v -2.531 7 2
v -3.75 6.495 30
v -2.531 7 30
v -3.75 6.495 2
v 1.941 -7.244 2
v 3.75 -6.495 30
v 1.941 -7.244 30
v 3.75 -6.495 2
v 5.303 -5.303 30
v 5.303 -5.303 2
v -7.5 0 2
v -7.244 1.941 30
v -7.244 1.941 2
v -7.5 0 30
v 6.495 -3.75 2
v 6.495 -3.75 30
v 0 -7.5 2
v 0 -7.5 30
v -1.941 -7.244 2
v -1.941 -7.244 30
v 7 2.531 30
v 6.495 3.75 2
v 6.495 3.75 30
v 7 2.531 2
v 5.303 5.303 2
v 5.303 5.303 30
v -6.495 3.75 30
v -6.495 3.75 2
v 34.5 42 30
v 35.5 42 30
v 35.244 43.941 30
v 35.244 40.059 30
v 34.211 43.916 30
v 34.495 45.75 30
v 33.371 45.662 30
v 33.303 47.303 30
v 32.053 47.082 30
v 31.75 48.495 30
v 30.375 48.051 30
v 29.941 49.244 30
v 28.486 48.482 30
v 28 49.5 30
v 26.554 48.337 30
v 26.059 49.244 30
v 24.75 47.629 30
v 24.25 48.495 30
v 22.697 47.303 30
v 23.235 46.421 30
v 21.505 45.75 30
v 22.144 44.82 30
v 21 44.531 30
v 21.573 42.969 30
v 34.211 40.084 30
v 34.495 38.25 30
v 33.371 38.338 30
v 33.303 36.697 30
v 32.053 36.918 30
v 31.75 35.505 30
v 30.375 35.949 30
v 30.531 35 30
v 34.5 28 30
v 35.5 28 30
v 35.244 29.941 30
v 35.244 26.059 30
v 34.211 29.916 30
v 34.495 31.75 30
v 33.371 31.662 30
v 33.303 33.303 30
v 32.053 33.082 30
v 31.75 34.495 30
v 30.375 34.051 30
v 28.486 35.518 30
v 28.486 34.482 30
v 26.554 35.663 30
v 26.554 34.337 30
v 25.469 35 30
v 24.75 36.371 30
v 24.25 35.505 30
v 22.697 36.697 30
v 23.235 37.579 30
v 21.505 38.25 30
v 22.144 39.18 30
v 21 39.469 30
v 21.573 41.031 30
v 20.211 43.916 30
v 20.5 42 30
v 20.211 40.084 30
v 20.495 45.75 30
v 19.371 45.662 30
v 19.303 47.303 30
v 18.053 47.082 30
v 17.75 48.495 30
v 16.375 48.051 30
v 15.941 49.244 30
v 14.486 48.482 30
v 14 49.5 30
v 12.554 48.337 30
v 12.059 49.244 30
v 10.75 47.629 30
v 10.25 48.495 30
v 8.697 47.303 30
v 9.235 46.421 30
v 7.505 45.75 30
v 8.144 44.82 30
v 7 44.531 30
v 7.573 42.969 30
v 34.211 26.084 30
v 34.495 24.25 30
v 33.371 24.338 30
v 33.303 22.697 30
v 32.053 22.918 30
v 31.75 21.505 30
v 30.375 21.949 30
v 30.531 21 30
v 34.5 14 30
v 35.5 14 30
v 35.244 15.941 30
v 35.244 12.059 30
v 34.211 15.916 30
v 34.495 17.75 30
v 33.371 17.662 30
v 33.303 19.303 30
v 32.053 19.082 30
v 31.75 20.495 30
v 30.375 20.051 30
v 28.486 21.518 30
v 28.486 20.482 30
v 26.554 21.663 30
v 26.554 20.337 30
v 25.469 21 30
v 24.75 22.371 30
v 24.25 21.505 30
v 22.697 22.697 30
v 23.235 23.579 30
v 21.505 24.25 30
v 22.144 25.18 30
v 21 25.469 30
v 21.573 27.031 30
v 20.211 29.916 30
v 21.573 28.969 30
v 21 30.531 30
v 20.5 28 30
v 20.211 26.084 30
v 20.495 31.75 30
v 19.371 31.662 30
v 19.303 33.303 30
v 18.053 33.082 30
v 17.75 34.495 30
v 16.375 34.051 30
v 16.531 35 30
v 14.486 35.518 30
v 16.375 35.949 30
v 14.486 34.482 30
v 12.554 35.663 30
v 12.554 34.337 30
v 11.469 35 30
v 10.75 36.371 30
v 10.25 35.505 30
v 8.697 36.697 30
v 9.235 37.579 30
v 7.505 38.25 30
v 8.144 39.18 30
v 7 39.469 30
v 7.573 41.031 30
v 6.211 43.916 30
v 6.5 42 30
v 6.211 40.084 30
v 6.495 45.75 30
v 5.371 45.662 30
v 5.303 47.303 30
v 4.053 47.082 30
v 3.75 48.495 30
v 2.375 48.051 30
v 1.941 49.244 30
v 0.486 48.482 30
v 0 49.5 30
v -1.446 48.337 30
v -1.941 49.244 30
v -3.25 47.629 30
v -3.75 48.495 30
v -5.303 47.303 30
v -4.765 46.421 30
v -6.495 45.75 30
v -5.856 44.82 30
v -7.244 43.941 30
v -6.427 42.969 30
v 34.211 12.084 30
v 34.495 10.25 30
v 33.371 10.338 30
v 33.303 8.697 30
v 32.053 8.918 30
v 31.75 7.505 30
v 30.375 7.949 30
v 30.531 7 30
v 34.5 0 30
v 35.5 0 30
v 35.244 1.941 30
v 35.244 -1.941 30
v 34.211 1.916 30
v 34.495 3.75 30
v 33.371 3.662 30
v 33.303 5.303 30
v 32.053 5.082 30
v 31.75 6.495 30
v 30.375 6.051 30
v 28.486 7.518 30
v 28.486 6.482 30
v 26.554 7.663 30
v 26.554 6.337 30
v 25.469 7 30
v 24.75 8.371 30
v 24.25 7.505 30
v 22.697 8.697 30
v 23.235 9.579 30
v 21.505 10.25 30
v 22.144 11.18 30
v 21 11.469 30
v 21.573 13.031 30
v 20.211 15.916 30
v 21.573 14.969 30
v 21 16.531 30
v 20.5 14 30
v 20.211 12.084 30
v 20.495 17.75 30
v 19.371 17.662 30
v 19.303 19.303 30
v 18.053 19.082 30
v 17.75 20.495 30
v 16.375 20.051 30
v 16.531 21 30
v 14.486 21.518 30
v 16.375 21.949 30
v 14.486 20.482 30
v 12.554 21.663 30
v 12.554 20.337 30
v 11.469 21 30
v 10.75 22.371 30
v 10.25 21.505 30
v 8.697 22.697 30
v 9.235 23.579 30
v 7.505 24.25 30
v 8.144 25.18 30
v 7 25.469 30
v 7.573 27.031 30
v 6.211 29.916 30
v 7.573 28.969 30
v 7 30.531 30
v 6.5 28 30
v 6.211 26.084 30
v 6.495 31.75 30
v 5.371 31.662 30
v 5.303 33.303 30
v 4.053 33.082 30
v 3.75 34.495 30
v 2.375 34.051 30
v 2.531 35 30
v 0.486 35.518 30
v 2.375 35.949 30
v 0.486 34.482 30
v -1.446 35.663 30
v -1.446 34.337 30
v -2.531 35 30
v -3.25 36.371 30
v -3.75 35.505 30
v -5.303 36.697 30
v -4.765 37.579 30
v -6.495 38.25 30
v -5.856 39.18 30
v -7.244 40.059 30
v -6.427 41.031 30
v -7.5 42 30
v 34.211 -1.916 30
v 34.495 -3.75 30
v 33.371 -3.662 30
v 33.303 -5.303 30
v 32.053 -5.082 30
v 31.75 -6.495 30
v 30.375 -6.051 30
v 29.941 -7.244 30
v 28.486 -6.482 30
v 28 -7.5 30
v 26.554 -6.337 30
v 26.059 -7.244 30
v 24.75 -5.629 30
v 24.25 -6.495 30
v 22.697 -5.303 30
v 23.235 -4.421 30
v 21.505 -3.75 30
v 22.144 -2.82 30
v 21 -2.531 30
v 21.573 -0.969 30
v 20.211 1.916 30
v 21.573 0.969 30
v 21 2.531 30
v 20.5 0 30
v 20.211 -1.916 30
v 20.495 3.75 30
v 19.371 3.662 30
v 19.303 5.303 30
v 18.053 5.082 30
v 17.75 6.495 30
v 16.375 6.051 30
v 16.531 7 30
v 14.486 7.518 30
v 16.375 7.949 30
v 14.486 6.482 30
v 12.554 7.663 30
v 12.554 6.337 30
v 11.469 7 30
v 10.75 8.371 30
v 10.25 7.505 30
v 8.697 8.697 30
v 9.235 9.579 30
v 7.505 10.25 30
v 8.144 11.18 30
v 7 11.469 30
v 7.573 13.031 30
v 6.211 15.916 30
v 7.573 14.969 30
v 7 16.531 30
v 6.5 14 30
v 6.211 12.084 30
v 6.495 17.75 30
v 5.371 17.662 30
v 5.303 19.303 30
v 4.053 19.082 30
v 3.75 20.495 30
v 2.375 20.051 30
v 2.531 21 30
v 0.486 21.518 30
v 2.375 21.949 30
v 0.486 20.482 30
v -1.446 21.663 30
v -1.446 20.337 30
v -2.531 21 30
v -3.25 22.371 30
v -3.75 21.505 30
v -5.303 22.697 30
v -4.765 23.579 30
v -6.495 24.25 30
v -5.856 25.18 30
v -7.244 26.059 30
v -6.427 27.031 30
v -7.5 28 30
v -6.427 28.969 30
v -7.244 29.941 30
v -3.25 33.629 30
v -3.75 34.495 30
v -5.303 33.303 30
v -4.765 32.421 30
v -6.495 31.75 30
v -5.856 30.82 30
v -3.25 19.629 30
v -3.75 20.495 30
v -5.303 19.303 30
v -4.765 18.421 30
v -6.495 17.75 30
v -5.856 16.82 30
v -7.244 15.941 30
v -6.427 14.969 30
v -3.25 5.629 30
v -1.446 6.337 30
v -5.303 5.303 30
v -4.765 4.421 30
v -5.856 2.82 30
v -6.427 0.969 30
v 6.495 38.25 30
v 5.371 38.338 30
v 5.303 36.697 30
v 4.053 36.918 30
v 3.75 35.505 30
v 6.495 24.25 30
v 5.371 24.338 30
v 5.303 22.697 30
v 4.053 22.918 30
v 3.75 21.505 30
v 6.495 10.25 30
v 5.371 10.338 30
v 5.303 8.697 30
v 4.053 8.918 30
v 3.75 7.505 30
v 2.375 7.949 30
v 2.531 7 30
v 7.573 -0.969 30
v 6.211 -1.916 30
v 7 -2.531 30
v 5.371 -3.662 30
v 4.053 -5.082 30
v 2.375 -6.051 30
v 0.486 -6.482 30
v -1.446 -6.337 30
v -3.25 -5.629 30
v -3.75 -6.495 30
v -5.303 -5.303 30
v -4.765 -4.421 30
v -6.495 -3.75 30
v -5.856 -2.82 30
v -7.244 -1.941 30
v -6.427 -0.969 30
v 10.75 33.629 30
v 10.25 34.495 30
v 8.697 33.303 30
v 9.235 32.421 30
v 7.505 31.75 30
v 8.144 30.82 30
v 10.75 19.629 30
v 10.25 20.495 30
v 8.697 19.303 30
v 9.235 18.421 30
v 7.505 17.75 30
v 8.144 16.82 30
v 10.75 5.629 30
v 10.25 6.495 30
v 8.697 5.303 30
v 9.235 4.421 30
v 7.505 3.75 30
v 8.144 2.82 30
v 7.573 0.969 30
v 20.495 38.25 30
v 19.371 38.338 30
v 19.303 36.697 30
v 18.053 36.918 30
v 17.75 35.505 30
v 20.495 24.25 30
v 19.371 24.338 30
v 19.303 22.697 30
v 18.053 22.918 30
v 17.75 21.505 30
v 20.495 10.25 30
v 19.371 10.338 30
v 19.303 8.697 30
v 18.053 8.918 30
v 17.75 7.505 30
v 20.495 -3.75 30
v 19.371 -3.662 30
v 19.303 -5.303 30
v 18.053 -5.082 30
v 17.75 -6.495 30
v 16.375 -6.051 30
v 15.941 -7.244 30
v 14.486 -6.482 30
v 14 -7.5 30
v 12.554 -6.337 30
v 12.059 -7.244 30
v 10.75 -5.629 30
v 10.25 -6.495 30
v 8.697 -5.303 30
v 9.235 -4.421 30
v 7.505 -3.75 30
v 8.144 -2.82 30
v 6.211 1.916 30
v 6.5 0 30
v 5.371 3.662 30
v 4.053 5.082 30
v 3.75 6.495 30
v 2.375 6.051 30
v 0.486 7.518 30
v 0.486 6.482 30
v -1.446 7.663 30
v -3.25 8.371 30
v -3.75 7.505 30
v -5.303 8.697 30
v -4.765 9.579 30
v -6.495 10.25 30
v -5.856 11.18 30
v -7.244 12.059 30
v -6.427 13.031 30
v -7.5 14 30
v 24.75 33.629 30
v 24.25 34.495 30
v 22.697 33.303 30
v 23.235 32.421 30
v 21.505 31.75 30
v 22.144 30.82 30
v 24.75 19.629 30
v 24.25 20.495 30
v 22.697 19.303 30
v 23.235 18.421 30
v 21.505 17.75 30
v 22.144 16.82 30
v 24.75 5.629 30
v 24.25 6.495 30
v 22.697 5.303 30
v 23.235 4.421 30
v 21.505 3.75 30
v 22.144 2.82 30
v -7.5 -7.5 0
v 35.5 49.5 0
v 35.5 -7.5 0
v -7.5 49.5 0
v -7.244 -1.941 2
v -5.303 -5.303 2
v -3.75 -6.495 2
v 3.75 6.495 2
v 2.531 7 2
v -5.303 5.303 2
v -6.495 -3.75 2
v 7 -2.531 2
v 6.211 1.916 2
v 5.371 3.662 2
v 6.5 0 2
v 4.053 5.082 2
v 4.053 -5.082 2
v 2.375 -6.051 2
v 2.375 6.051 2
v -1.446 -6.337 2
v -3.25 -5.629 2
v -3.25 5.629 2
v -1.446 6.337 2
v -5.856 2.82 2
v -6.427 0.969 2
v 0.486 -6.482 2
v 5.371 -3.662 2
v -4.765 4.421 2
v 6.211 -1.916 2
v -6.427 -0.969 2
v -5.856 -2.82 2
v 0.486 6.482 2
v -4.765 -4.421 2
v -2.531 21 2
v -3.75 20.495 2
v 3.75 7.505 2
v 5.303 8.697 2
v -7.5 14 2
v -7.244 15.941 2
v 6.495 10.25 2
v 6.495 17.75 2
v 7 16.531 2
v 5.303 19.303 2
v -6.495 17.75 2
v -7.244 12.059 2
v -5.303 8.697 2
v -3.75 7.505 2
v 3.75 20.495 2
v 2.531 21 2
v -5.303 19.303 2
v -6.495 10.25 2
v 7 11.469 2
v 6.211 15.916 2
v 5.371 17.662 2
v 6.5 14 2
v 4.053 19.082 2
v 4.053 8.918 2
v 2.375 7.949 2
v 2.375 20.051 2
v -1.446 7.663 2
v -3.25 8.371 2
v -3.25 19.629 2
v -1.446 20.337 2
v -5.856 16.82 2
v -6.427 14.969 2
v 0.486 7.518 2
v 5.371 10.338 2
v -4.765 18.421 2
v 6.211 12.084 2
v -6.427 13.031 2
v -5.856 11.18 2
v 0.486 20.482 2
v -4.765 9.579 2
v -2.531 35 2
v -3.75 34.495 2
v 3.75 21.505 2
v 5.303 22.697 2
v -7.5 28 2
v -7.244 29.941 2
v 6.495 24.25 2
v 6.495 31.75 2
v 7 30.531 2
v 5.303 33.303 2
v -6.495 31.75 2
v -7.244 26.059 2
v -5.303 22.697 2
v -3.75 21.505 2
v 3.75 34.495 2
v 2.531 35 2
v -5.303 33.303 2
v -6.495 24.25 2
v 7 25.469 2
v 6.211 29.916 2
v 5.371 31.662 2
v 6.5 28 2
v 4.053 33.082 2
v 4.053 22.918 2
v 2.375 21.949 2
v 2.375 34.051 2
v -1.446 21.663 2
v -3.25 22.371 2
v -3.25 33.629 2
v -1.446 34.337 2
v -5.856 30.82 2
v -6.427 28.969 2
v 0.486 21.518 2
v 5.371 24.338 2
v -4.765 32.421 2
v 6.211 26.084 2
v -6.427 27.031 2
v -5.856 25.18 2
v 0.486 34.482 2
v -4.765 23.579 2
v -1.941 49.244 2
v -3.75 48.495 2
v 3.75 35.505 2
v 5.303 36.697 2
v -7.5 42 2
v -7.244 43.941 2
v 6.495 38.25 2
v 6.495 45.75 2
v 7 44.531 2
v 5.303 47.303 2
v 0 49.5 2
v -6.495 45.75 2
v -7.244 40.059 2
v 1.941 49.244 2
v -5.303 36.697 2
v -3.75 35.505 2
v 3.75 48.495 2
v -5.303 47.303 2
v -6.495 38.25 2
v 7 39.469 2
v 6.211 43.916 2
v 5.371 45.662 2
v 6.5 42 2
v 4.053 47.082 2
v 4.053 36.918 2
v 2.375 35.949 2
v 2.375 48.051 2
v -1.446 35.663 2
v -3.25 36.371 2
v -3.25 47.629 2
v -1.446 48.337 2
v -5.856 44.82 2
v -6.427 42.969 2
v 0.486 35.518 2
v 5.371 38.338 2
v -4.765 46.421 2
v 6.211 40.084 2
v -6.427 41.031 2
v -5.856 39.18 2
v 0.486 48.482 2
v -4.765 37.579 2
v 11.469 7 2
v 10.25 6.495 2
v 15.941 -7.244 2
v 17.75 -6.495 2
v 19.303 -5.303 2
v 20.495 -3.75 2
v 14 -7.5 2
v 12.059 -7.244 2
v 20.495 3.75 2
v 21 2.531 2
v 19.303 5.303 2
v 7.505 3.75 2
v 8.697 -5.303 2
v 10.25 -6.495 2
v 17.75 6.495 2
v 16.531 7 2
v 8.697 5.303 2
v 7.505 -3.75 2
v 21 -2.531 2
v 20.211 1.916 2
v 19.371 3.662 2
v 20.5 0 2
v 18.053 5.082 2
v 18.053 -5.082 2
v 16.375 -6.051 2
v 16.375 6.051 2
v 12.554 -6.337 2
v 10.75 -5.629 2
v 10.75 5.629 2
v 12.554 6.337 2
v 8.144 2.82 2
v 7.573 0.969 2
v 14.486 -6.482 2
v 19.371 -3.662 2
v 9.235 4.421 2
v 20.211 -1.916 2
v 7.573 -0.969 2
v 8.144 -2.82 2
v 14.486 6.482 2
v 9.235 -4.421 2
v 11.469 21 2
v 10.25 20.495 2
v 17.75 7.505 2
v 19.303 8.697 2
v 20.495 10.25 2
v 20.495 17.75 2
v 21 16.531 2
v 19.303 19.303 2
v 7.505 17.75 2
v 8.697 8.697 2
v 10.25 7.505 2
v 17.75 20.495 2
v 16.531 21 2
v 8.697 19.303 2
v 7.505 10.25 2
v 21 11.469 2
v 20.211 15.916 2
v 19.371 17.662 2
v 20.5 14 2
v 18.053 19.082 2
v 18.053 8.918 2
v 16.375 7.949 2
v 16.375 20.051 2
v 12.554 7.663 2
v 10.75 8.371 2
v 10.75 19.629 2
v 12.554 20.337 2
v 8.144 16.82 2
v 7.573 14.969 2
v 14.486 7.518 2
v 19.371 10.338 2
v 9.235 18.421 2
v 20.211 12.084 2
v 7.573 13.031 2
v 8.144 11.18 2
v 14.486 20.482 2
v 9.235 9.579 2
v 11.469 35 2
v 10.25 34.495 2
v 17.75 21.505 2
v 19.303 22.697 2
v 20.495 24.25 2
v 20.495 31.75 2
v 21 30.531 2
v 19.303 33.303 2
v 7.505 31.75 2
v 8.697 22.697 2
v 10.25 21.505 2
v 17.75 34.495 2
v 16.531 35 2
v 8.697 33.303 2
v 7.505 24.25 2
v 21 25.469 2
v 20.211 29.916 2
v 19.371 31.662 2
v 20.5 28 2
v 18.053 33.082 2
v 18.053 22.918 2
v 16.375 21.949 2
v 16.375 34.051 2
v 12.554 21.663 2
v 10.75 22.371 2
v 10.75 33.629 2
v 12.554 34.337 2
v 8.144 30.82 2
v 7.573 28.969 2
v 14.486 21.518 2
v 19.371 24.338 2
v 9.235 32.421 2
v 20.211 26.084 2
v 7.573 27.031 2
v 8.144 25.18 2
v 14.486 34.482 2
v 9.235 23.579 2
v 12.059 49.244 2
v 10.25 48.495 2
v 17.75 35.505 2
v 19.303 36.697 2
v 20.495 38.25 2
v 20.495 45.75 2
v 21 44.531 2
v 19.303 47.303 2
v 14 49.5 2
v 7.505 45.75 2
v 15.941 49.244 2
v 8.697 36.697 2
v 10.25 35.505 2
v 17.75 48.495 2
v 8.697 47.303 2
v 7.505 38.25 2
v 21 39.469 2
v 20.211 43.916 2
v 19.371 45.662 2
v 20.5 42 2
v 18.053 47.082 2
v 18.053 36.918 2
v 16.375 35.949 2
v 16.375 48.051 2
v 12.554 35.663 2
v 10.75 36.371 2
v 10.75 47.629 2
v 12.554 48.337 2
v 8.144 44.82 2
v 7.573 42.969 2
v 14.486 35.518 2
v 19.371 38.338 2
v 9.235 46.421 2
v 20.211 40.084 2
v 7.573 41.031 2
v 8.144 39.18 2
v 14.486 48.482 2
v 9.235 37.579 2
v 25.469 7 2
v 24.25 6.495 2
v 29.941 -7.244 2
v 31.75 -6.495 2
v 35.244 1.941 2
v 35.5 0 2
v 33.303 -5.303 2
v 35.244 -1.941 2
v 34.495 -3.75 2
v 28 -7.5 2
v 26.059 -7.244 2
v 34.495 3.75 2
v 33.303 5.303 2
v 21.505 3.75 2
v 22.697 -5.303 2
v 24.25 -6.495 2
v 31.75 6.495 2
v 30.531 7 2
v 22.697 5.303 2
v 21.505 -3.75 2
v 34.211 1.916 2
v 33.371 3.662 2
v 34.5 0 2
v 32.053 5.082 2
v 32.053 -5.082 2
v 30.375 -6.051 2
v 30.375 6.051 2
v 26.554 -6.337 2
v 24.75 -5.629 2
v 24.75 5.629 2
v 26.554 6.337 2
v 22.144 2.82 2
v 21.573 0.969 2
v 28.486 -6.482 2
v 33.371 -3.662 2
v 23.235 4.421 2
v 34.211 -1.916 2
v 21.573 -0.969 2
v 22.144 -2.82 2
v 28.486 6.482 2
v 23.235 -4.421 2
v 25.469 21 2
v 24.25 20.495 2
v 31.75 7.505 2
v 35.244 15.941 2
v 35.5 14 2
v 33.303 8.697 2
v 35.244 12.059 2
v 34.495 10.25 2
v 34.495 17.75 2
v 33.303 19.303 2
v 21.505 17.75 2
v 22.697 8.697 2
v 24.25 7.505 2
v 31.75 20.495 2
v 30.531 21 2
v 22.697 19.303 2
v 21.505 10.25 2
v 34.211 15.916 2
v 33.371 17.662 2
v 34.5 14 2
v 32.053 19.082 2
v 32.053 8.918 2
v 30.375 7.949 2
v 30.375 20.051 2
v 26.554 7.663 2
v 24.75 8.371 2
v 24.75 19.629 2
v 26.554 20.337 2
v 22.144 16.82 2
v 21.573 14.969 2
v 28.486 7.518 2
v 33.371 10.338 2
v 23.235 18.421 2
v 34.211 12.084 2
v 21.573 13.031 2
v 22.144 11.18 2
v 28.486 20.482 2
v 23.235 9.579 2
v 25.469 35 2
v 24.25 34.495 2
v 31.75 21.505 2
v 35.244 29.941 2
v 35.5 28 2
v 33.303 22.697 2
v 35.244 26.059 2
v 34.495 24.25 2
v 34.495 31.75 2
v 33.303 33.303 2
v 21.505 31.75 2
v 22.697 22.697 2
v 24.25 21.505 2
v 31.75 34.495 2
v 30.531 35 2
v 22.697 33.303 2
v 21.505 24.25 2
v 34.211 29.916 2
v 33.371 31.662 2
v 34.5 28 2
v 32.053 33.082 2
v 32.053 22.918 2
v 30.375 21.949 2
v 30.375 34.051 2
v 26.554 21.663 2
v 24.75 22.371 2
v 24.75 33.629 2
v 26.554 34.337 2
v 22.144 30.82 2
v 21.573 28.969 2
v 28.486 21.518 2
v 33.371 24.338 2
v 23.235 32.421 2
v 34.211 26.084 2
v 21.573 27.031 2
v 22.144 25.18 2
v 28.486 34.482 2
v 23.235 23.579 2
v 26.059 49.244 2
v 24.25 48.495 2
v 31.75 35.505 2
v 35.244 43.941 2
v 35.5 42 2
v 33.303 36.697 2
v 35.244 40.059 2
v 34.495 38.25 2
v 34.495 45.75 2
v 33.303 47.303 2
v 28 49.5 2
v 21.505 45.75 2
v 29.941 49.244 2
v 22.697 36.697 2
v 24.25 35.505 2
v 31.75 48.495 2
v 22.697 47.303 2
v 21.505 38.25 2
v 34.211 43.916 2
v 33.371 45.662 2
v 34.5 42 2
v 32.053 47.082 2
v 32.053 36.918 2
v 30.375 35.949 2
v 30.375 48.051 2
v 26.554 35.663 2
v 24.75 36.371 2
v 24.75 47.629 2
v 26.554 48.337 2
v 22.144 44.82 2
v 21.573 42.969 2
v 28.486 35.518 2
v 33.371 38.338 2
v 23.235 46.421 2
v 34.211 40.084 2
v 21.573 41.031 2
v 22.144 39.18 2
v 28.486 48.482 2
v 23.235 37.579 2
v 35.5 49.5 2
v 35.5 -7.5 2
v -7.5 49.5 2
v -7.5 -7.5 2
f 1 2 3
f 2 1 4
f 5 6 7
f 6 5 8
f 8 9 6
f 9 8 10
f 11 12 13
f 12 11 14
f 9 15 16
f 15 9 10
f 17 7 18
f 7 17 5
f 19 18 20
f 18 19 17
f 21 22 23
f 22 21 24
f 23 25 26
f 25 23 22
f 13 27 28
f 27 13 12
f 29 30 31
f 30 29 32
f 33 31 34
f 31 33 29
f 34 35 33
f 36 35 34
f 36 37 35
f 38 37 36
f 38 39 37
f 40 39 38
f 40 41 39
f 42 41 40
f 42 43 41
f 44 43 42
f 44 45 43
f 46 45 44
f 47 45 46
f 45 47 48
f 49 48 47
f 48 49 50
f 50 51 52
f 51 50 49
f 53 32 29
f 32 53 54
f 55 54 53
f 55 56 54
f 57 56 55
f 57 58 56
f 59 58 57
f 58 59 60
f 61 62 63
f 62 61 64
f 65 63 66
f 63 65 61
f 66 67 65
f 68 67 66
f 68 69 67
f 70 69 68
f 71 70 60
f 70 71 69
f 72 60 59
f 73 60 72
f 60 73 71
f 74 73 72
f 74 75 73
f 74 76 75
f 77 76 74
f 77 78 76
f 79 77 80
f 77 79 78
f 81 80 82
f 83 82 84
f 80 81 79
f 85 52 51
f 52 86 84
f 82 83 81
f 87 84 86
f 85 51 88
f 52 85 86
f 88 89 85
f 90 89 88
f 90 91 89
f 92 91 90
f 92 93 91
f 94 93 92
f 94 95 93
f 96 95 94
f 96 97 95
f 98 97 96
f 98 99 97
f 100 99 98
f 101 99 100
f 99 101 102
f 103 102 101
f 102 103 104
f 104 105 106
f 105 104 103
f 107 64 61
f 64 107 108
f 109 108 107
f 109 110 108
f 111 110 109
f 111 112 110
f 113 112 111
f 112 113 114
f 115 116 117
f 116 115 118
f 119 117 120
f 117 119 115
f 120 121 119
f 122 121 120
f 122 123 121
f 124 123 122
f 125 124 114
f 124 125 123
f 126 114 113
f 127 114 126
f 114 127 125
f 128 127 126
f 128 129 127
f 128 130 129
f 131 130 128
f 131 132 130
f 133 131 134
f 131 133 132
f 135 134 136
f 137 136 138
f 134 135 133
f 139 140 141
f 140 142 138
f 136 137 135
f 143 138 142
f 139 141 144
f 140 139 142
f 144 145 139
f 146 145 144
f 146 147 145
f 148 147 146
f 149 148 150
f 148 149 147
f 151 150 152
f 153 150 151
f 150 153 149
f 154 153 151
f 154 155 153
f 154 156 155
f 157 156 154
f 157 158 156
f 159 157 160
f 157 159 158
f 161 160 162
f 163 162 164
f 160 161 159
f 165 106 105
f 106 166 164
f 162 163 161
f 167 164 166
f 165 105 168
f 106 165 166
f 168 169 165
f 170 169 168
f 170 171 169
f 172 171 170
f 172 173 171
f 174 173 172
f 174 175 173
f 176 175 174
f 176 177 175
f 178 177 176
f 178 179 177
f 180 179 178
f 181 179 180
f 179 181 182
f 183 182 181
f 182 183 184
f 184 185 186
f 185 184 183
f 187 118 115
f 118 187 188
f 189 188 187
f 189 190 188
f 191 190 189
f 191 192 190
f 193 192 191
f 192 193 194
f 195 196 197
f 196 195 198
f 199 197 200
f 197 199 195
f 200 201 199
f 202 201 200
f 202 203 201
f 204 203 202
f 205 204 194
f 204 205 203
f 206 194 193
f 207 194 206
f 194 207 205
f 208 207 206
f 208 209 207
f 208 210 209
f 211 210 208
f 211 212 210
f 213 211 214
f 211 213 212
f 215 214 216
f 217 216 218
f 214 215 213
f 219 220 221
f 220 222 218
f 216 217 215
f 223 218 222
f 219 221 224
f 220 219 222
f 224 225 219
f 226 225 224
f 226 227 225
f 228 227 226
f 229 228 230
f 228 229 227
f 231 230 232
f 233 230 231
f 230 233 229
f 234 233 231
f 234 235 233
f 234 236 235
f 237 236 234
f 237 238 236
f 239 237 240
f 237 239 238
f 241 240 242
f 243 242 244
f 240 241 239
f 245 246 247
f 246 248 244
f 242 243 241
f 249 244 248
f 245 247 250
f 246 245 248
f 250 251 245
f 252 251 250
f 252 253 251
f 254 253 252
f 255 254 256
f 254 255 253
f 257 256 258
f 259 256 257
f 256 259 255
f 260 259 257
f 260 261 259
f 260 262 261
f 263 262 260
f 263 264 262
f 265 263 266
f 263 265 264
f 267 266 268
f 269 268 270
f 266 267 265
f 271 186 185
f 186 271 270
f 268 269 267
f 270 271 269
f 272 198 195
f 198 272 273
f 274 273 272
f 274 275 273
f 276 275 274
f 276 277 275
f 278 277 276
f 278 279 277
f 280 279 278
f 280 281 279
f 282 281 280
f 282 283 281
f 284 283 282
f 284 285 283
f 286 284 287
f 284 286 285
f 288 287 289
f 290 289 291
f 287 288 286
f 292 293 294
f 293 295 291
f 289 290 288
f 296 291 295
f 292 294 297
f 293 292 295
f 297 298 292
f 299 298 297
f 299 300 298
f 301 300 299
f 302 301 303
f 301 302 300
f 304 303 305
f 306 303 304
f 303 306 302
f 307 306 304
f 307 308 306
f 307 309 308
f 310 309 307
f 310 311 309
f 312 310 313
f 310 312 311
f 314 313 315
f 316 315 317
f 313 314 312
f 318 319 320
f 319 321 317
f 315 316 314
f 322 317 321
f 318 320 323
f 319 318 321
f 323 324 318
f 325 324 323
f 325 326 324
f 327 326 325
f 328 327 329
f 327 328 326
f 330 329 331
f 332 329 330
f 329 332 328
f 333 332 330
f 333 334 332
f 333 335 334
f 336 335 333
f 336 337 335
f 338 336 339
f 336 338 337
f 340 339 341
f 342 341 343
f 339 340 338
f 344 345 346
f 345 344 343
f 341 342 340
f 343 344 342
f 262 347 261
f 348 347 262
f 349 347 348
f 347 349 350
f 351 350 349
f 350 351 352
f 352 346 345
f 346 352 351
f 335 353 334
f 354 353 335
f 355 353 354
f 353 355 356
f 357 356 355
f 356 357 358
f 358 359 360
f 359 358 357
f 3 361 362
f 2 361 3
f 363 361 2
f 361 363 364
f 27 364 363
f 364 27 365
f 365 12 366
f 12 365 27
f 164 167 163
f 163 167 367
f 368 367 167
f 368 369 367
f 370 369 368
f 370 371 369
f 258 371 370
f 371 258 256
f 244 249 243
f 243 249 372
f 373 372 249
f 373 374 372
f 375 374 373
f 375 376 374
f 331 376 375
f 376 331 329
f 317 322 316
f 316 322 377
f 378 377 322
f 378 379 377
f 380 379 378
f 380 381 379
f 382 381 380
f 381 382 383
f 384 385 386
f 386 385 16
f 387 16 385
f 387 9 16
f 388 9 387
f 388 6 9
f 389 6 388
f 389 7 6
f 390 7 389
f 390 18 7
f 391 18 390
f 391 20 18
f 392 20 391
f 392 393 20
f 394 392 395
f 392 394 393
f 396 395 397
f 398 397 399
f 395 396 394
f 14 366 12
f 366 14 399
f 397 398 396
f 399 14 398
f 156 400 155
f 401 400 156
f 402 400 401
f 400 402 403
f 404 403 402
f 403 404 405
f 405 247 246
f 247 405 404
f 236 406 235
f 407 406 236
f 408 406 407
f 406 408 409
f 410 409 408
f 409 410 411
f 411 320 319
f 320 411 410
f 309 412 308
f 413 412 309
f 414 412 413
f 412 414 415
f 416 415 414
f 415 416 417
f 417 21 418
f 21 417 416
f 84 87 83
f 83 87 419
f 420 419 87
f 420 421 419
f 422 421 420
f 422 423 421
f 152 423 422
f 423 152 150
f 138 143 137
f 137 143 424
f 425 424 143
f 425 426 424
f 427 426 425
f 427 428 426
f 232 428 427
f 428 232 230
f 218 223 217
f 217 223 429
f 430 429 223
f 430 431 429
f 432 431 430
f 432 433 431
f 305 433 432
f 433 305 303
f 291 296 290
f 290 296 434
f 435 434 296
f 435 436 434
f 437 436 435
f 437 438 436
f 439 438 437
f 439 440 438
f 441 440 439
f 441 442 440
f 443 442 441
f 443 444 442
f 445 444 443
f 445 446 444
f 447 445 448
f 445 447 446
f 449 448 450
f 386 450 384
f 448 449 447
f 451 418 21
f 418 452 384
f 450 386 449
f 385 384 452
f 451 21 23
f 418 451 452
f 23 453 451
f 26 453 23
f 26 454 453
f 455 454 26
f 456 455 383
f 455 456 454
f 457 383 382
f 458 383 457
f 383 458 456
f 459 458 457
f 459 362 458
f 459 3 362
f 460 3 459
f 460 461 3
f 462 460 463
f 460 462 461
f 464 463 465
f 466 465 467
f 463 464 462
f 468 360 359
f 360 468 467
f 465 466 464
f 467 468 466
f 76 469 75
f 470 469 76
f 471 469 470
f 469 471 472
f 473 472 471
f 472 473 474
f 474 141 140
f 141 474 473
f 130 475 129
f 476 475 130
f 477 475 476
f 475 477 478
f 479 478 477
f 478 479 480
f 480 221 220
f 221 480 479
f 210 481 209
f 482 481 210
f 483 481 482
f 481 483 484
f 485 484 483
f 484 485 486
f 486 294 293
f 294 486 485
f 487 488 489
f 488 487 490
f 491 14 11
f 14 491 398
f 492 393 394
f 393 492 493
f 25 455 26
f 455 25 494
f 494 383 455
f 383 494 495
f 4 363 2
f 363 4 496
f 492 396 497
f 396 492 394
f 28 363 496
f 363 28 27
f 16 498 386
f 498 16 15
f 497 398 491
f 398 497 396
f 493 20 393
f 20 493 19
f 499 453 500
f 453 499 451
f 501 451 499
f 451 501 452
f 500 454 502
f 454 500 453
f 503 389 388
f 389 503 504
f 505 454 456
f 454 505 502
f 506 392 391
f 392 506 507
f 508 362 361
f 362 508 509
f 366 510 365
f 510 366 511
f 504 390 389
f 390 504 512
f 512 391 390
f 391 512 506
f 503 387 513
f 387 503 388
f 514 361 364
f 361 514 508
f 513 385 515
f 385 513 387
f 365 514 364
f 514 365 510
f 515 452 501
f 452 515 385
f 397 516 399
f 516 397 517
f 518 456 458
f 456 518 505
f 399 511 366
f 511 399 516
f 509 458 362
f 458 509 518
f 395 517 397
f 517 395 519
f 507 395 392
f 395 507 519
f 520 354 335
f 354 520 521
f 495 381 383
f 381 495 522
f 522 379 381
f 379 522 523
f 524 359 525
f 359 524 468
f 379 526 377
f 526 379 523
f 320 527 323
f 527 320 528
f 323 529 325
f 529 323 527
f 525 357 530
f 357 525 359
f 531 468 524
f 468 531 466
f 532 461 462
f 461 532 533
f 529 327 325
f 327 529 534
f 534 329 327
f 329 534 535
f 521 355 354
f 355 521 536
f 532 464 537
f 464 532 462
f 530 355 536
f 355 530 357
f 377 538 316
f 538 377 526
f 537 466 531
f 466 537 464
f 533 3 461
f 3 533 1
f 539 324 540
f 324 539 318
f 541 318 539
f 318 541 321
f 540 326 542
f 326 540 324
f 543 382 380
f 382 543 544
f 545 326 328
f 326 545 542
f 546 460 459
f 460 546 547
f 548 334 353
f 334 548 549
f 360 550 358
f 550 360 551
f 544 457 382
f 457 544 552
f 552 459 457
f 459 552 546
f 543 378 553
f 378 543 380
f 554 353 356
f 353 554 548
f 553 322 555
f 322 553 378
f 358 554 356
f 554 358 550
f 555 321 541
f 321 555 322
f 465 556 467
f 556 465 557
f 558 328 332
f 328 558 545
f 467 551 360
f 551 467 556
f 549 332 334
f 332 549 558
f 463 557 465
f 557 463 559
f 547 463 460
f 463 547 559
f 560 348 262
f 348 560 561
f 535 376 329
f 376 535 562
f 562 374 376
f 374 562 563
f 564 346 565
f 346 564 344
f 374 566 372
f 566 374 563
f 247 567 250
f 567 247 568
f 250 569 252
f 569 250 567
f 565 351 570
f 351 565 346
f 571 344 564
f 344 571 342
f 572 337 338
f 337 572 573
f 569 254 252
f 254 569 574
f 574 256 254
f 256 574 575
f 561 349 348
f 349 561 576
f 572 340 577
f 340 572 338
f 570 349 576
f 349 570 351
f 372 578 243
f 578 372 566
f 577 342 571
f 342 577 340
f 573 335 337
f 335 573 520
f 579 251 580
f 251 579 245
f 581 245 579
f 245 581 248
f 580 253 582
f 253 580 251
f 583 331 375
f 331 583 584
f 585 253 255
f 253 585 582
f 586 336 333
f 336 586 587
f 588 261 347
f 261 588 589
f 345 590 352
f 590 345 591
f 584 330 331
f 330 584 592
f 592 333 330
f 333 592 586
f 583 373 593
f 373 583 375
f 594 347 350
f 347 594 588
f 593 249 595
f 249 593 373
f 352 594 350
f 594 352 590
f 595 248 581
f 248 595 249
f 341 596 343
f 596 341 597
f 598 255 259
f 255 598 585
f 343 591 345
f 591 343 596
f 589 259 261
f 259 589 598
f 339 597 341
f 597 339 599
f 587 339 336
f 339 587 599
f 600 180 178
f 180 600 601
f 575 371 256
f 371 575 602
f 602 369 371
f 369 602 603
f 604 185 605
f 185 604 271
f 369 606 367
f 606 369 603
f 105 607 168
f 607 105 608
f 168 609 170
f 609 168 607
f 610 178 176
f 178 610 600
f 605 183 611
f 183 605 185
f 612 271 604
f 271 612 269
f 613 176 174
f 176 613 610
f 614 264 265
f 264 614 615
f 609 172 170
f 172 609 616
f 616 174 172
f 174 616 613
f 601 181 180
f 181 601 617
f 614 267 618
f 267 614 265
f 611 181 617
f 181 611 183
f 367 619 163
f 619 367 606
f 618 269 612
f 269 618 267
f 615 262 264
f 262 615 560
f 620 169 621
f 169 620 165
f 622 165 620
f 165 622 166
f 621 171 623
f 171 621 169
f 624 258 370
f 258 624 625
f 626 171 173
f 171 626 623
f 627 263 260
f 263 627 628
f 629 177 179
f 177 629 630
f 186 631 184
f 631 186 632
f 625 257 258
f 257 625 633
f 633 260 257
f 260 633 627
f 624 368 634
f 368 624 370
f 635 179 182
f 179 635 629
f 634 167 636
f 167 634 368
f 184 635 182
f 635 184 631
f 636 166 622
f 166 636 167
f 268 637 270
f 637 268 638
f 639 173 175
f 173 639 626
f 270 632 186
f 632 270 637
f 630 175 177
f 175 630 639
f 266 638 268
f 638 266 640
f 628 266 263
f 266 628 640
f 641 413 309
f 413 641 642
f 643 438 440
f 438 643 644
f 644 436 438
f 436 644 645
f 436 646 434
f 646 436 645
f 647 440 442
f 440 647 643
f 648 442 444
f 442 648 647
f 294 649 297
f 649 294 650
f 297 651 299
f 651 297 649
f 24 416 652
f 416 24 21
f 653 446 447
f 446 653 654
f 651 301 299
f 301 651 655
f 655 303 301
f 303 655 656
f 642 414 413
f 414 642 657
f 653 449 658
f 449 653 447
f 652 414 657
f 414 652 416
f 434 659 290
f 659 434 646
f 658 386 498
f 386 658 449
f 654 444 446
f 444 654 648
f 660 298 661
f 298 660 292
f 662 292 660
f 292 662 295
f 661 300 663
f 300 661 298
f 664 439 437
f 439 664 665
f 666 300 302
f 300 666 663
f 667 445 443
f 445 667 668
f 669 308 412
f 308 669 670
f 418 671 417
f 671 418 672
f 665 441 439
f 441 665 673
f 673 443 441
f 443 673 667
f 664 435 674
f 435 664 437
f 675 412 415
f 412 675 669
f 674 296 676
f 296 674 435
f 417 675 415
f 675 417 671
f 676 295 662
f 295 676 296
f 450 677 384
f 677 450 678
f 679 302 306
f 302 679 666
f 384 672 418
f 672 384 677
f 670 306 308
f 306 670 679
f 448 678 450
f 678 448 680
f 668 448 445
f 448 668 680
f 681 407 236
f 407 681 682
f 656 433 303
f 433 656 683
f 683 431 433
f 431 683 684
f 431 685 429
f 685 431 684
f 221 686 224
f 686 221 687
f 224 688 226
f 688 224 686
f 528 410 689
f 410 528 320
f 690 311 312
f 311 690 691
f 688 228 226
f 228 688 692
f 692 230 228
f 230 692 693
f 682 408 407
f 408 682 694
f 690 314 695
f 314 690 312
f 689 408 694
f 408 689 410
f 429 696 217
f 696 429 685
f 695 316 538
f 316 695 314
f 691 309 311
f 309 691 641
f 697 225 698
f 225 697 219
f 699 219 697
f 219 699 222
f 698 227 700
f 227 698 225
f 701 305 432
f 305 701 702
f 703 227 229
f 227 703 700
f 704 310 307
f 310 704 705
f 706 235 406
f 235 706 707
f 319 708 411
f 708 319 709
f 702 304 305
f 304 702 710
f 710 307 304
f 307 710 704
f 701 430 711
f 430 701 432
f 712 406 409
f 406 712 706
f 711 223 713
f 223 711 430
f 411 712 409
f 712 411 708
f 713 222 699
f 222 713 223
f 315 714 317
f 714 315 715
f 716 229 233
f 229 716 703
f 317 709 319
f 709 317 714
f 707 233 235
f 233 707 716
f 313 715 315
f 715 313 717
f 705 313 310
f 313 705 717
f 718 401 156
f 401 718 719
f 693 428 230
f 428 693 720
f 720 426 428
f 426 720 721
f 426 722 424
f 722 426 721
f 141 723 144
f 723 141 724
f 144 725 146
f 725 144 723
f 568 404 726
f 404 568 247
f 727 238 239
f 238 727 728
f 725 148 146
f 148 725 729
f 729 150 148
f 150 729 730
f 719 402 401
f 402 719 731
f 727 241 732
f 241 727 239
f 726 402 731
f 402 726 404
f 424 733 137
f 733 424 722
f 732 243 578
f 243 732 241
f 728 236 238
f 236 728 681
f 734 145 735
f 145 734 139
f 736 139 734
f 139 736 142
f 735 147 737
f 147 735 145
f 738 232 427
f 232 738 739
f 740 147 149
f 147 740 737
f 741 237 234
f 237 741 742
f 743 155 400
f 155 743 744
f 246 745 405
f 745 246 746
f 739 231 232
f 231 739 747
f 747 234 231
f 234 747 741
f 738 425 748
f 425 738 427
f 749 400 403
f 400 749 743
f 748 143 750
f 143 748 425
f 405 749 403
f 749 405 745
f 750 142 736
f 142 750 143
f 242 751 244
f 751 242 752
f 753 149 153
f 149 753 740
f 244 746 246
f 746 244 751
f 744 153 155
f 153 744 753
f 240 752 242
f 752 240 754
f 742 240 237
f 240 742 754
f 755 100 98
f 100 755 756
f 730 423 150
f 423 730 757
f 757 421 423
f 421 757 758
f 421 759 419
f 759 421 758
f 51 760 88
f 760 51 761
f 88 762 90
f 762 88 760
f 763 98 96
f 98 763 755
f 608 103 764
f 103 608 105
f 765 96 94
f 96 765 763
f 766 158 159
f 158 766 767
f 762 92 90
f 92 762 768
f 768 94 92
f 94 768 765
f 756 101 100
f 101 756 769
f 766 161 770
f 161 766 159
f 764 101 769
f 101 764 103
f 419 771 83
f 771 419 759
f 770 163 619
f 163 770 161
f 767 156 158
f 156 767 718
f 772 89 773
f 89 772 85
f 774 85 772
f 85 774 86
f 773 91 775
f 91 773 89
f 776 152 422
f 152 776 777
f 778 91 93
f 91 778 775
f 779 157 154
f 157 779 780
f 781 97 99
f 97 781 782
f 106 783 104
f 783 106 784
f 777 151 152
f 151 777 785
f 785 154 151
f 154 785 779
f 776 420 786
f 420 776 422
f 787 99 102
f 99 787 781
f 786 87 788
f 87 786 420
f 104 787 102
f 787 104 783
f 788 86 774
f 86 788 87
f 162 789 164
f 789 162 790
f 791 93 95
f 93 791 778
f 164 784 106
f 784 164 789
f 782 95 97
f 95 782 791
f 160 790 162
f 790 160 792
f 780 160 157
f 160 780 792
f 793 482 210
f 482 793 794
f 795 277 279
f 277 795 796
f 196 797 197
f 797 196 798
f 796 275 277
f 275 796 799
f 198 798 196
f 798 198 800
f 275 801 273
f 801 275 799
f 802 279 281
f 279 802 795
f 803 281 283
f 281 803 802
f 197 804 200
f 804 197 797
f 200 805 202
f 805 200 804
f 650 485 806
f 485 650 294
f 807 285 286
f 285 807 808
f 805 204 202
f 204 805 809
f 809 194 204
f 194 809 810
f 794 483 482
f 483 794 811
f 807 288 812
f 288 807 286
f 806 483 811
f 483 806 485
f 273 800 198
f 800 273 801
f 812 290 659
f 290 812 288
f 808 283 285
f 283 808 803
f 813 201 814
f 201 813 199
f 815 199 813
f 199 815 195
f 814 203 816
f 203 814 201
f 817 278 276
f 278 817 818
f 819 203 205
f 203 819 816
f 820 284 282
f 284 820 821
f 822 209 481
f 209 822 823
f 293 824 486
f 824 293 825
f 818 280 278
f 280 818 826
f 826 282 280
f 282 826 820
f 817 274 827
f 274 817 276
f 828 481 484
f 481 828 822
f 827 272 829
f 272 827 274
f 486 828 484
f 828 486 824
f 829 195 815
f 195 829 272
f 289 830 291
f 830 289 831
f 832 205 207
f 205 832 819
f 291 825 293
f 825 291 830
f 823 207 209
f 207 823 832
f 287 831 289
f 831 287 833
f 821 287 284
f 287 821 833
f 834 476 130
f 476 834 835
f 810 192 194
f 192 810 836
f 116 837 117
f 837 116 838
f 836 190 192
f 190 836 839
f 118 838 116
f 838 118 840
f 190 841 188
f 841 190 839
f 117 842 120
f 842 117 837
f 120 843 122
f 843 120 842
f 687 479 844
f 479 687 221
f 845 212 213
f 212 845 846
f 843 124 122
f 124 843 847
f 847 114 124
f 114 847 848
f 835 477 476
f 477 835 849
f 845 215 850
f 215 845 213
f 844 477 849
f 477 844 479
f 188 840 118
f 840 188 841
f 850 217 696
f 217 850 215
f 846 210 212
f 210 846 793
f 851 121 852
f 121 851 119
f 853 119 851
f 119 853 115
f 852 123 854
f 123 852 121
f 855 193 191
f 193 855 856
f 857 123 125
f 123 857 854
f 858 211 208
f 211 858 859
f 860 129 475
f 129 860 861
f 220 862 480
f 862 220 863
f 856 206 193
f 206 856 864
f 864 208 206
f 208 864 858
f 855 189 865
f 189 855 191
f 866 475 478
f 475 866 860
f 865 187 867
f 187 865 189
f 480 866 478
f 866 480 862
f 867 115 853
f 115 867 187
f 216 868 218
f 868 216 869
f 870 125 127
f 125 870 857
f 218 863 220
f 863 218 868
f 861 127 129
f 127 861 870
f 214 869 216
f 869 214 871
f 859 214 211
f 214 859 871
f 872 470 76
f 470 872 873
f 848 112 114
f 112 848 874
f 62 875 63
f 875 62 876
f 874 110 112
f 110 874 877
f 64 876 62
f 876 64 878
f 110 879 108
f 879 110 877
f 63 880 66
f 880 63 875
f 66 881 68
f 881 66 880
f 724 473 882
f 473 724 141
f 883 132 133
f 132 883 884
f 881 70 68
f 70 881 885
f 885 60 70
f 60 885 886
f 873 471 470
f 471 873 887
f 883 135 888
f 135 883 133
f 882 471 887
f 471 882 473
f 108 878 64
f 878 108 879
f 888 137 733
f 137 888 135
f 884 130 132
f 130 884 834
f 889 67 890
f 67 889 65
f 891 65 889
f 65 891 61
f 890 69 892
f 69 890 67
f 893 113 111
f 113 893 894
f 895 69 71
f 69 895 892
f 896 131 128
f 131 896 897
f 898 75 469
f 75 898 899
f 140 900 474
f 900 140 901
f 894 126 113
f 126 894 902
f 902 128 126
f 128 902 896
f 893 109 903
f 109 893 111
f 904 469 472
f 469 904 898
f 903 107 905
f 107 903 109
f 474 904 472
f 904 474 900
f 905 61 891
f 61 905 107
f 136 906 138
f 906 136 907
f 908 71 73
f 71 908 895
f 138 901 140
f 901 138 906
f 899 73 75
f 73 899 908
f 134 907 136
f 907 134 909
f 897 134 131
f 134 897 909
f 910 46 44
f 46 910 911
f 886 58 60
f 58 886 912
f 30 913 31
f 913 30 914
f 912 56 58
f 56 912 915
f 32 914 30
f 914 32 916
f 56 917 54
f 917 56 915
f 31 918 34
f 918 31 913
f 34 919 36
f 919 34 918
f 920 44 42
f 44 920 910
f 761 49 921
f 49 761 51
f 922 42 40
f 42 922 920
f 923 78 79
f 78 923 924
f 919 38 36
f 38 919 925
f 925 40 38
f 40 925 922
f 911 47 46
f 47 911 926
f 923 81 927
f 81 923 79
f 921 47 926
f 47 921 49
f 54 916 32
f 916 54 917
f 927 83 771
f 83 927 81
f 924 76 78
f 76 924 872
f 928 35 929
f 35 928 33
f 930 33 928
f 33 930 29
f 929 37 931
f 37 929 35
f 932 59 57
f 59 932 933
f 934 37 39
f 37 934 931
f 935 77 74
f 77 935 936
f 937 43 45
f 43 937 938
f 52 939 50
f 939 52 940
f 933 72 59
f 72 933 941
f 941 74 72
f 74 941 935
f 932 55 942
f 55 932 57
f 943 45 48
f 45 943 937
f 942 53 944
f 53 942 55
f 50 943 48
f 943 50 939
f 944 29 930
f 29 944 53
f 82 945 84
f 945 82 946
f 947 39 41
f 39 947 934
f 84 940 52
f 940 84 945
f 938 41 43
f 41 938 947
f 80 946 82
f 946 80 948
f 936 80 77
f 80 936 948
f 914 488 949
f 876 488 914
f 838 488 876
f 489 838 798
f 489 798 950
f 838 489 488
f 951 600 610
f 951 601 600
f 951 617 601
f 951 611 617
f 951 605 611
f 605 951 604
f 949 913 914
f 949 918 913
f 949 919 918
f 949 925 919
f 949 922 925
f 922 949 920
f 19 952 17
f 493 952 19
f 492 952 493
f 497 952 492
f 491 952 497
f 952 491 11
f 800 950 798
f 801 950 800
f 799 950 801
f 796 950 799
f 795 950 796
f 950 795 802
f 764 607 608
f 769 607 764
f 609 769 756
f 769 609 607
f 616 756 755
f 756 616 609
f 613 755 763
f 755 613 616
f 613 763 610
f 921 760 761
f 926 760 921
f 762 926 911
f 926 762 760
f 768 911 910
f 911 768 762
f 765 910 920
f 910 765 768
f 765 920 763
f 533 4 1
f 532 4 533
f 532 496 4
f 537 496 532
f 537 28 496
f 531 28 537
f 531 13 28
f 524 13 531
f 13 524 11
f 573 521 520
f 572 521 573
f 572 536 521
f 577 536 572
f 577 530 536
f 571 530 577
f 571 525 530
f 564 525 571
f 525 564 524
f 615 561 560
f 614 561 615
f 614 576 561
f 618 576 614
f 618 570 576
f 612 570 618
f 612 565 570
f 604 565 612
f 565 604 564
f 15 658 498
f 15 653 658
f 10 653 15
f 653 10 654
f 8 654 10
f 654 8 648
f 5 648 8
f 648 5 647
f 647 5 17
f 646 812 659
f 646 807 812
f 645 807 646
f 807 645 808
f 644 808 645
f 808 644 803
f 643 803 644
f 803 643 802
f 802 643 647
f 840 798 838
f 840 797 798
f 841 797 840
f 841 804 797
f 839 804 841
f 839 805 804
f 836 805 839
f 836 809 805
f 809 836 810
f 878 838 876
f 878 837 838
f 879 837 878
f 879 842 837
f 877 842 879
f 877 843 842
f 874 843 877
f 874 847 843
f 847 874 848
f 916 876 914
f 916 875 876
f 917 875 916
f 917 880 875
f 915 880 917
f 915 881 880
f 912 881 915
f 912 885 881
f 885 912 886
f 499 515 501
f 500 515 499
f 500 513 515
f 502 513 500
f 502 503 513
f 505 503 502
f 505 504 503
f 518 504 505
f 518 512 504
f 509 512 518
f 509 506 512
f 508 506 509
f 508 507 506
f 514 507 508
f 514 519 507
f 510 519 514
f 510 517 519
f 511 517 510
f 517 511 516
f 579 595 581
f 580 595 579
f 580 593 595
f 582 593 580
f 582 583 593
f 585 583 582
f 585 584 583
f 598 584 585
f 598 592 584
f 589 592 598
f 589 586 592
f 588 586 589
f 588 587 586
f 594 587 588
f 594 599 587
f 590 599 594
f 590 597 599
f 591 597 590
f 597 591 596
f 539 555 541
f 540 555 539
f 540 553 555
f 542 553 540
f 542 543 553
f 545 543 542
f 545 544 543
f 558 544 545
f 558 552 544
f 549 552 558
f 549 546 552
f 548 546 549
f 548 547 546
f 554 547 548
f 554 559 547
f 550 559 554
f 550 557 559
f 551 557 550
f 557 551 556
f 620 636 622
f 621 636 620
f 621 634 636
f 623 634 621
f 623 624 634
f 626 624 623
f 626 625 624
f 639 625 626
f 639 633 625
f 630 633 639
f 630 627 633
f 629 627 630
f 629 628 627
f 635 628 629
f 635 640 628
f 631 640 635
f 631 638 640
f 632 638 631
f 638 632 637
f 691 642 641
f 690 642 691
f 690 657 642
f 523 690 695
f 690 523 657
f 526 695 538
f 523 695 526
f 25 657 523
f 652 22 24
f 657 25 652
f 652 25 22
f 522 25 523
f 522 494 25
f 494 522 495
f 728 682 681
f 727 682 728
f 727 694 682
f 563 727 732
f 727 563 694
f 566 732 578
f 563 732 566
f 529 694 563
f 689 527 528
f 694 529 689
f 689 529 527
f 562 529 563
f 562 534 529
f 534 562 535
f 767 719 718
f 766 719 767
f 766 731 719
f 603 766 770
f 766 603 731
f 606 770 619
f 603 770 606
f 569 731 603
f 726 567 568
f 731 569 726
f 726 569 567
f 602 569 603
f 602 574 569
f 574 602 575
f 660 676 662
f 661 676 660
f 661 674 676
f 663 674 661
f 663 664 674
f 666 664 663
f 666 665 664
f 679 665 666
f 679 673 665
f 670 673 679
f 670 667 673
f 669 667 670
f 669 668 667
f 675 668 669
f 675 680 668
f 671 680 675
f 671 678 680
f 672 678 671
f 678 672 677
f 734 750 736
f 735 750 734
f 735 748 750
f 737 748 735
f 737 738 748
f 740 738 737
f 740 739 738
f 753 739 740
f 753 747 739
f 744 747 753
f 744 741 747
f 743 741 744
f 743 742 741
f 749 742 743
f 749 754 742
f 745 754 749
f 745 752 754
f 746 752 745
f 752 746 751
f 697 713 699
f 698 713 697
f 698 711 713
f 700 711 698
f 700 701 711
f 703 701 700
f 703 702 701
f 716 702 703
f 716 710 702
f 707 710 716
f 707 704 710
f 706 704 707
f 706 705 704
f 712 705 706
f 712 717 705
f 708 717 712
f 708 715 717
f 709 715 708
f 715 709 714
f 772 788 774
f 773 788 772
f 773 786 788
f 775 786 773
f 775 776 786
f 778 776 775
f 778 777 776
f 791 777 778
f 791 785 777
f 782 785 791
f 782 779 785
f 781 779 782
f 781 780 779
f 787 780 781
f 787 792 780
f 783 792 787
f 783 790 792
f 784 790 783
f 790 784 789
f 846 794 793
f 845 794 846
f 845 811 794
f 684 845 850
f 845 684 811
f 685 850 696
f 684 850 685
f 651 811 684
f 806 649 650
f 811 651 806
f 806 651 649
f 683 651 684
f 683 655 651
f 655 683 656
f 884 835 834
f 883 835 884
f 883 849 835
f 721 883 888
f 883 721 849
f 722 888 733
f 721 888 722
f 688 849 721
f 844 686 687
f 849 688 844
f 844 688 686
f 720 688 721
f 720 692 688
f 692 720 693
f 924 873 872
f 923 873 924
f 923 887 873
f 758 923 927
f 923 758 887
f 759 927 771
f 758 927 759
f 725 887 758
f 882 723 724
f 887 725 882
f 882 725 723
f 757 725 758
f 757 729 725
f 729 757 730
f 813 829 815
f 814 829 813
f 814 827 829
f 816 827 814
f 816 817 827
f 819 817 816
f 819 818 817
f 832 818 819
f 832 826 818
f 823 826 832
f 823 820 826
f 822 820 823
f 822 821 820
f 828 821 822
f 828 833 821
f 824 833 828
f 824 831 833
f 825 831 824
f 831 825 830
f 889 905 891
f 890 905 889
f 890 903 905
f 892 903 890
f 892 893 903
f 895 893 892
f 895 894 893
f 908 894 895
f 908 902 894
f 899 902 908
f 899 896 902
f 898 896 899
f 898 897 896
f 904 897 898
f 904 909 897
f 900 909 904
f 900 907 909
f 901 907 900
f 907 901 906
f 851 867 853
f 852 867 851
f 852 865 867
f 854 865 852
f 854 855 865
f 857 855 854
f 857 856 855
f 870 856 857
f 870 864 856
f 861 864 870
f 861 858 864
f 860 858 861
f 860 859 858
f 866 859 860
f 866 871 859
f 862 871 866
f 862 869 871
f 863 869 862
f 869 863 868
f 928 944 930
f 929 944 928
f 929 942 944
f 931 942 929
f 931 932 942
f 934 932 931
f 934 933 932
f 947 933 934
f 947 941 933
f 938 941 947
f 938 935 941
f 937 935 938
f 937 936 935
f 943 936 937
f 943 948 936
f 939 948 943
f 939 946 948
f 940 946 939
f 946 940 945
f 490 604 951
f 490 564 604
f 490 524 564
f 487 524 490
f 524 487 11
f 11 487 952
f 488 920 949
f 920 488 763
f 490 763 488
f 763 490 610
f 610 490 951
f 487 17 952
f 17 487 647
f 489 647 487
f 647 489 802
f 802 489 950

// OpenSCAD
// Customizable screw driver stand
// Created by Kjell Kernen
// Date 30.9.2015

/*[Pattern Parameters]*/
// of screw drivers:
rows=3;       // [2:5]

// of screw drivers per row:
number=4;     // [2:6]

// of the stand in mm:
height=30;    // [15:50]

// of the screw driver tubes in mm:
inner_diameter=14;  // [10:40]


/*[Hidden]*/
diameter = inner_diameter+1;
/* Modules */

module tube(height,width)
{
	difference()
	{
		cylinder(r=(width/2),    h=height);	
		translate([0,0,-1])
           cylinder(r=(width/2 -1), h=height+2);
	}
}

// Drawing starts here ********************************************

//Base
translate([-diameter/2,-diameter/2,0])
    cube([rows*(diameter-1)+1,number*(diameter-1)+1,2]); 

        
//Tubes
for (xi=[0:1:rows-1])
    for(yi=[0:1:number-1])
        translate([xi*(diameter-1),yi*(diameter-1),0])
            tube (height, diameter);
